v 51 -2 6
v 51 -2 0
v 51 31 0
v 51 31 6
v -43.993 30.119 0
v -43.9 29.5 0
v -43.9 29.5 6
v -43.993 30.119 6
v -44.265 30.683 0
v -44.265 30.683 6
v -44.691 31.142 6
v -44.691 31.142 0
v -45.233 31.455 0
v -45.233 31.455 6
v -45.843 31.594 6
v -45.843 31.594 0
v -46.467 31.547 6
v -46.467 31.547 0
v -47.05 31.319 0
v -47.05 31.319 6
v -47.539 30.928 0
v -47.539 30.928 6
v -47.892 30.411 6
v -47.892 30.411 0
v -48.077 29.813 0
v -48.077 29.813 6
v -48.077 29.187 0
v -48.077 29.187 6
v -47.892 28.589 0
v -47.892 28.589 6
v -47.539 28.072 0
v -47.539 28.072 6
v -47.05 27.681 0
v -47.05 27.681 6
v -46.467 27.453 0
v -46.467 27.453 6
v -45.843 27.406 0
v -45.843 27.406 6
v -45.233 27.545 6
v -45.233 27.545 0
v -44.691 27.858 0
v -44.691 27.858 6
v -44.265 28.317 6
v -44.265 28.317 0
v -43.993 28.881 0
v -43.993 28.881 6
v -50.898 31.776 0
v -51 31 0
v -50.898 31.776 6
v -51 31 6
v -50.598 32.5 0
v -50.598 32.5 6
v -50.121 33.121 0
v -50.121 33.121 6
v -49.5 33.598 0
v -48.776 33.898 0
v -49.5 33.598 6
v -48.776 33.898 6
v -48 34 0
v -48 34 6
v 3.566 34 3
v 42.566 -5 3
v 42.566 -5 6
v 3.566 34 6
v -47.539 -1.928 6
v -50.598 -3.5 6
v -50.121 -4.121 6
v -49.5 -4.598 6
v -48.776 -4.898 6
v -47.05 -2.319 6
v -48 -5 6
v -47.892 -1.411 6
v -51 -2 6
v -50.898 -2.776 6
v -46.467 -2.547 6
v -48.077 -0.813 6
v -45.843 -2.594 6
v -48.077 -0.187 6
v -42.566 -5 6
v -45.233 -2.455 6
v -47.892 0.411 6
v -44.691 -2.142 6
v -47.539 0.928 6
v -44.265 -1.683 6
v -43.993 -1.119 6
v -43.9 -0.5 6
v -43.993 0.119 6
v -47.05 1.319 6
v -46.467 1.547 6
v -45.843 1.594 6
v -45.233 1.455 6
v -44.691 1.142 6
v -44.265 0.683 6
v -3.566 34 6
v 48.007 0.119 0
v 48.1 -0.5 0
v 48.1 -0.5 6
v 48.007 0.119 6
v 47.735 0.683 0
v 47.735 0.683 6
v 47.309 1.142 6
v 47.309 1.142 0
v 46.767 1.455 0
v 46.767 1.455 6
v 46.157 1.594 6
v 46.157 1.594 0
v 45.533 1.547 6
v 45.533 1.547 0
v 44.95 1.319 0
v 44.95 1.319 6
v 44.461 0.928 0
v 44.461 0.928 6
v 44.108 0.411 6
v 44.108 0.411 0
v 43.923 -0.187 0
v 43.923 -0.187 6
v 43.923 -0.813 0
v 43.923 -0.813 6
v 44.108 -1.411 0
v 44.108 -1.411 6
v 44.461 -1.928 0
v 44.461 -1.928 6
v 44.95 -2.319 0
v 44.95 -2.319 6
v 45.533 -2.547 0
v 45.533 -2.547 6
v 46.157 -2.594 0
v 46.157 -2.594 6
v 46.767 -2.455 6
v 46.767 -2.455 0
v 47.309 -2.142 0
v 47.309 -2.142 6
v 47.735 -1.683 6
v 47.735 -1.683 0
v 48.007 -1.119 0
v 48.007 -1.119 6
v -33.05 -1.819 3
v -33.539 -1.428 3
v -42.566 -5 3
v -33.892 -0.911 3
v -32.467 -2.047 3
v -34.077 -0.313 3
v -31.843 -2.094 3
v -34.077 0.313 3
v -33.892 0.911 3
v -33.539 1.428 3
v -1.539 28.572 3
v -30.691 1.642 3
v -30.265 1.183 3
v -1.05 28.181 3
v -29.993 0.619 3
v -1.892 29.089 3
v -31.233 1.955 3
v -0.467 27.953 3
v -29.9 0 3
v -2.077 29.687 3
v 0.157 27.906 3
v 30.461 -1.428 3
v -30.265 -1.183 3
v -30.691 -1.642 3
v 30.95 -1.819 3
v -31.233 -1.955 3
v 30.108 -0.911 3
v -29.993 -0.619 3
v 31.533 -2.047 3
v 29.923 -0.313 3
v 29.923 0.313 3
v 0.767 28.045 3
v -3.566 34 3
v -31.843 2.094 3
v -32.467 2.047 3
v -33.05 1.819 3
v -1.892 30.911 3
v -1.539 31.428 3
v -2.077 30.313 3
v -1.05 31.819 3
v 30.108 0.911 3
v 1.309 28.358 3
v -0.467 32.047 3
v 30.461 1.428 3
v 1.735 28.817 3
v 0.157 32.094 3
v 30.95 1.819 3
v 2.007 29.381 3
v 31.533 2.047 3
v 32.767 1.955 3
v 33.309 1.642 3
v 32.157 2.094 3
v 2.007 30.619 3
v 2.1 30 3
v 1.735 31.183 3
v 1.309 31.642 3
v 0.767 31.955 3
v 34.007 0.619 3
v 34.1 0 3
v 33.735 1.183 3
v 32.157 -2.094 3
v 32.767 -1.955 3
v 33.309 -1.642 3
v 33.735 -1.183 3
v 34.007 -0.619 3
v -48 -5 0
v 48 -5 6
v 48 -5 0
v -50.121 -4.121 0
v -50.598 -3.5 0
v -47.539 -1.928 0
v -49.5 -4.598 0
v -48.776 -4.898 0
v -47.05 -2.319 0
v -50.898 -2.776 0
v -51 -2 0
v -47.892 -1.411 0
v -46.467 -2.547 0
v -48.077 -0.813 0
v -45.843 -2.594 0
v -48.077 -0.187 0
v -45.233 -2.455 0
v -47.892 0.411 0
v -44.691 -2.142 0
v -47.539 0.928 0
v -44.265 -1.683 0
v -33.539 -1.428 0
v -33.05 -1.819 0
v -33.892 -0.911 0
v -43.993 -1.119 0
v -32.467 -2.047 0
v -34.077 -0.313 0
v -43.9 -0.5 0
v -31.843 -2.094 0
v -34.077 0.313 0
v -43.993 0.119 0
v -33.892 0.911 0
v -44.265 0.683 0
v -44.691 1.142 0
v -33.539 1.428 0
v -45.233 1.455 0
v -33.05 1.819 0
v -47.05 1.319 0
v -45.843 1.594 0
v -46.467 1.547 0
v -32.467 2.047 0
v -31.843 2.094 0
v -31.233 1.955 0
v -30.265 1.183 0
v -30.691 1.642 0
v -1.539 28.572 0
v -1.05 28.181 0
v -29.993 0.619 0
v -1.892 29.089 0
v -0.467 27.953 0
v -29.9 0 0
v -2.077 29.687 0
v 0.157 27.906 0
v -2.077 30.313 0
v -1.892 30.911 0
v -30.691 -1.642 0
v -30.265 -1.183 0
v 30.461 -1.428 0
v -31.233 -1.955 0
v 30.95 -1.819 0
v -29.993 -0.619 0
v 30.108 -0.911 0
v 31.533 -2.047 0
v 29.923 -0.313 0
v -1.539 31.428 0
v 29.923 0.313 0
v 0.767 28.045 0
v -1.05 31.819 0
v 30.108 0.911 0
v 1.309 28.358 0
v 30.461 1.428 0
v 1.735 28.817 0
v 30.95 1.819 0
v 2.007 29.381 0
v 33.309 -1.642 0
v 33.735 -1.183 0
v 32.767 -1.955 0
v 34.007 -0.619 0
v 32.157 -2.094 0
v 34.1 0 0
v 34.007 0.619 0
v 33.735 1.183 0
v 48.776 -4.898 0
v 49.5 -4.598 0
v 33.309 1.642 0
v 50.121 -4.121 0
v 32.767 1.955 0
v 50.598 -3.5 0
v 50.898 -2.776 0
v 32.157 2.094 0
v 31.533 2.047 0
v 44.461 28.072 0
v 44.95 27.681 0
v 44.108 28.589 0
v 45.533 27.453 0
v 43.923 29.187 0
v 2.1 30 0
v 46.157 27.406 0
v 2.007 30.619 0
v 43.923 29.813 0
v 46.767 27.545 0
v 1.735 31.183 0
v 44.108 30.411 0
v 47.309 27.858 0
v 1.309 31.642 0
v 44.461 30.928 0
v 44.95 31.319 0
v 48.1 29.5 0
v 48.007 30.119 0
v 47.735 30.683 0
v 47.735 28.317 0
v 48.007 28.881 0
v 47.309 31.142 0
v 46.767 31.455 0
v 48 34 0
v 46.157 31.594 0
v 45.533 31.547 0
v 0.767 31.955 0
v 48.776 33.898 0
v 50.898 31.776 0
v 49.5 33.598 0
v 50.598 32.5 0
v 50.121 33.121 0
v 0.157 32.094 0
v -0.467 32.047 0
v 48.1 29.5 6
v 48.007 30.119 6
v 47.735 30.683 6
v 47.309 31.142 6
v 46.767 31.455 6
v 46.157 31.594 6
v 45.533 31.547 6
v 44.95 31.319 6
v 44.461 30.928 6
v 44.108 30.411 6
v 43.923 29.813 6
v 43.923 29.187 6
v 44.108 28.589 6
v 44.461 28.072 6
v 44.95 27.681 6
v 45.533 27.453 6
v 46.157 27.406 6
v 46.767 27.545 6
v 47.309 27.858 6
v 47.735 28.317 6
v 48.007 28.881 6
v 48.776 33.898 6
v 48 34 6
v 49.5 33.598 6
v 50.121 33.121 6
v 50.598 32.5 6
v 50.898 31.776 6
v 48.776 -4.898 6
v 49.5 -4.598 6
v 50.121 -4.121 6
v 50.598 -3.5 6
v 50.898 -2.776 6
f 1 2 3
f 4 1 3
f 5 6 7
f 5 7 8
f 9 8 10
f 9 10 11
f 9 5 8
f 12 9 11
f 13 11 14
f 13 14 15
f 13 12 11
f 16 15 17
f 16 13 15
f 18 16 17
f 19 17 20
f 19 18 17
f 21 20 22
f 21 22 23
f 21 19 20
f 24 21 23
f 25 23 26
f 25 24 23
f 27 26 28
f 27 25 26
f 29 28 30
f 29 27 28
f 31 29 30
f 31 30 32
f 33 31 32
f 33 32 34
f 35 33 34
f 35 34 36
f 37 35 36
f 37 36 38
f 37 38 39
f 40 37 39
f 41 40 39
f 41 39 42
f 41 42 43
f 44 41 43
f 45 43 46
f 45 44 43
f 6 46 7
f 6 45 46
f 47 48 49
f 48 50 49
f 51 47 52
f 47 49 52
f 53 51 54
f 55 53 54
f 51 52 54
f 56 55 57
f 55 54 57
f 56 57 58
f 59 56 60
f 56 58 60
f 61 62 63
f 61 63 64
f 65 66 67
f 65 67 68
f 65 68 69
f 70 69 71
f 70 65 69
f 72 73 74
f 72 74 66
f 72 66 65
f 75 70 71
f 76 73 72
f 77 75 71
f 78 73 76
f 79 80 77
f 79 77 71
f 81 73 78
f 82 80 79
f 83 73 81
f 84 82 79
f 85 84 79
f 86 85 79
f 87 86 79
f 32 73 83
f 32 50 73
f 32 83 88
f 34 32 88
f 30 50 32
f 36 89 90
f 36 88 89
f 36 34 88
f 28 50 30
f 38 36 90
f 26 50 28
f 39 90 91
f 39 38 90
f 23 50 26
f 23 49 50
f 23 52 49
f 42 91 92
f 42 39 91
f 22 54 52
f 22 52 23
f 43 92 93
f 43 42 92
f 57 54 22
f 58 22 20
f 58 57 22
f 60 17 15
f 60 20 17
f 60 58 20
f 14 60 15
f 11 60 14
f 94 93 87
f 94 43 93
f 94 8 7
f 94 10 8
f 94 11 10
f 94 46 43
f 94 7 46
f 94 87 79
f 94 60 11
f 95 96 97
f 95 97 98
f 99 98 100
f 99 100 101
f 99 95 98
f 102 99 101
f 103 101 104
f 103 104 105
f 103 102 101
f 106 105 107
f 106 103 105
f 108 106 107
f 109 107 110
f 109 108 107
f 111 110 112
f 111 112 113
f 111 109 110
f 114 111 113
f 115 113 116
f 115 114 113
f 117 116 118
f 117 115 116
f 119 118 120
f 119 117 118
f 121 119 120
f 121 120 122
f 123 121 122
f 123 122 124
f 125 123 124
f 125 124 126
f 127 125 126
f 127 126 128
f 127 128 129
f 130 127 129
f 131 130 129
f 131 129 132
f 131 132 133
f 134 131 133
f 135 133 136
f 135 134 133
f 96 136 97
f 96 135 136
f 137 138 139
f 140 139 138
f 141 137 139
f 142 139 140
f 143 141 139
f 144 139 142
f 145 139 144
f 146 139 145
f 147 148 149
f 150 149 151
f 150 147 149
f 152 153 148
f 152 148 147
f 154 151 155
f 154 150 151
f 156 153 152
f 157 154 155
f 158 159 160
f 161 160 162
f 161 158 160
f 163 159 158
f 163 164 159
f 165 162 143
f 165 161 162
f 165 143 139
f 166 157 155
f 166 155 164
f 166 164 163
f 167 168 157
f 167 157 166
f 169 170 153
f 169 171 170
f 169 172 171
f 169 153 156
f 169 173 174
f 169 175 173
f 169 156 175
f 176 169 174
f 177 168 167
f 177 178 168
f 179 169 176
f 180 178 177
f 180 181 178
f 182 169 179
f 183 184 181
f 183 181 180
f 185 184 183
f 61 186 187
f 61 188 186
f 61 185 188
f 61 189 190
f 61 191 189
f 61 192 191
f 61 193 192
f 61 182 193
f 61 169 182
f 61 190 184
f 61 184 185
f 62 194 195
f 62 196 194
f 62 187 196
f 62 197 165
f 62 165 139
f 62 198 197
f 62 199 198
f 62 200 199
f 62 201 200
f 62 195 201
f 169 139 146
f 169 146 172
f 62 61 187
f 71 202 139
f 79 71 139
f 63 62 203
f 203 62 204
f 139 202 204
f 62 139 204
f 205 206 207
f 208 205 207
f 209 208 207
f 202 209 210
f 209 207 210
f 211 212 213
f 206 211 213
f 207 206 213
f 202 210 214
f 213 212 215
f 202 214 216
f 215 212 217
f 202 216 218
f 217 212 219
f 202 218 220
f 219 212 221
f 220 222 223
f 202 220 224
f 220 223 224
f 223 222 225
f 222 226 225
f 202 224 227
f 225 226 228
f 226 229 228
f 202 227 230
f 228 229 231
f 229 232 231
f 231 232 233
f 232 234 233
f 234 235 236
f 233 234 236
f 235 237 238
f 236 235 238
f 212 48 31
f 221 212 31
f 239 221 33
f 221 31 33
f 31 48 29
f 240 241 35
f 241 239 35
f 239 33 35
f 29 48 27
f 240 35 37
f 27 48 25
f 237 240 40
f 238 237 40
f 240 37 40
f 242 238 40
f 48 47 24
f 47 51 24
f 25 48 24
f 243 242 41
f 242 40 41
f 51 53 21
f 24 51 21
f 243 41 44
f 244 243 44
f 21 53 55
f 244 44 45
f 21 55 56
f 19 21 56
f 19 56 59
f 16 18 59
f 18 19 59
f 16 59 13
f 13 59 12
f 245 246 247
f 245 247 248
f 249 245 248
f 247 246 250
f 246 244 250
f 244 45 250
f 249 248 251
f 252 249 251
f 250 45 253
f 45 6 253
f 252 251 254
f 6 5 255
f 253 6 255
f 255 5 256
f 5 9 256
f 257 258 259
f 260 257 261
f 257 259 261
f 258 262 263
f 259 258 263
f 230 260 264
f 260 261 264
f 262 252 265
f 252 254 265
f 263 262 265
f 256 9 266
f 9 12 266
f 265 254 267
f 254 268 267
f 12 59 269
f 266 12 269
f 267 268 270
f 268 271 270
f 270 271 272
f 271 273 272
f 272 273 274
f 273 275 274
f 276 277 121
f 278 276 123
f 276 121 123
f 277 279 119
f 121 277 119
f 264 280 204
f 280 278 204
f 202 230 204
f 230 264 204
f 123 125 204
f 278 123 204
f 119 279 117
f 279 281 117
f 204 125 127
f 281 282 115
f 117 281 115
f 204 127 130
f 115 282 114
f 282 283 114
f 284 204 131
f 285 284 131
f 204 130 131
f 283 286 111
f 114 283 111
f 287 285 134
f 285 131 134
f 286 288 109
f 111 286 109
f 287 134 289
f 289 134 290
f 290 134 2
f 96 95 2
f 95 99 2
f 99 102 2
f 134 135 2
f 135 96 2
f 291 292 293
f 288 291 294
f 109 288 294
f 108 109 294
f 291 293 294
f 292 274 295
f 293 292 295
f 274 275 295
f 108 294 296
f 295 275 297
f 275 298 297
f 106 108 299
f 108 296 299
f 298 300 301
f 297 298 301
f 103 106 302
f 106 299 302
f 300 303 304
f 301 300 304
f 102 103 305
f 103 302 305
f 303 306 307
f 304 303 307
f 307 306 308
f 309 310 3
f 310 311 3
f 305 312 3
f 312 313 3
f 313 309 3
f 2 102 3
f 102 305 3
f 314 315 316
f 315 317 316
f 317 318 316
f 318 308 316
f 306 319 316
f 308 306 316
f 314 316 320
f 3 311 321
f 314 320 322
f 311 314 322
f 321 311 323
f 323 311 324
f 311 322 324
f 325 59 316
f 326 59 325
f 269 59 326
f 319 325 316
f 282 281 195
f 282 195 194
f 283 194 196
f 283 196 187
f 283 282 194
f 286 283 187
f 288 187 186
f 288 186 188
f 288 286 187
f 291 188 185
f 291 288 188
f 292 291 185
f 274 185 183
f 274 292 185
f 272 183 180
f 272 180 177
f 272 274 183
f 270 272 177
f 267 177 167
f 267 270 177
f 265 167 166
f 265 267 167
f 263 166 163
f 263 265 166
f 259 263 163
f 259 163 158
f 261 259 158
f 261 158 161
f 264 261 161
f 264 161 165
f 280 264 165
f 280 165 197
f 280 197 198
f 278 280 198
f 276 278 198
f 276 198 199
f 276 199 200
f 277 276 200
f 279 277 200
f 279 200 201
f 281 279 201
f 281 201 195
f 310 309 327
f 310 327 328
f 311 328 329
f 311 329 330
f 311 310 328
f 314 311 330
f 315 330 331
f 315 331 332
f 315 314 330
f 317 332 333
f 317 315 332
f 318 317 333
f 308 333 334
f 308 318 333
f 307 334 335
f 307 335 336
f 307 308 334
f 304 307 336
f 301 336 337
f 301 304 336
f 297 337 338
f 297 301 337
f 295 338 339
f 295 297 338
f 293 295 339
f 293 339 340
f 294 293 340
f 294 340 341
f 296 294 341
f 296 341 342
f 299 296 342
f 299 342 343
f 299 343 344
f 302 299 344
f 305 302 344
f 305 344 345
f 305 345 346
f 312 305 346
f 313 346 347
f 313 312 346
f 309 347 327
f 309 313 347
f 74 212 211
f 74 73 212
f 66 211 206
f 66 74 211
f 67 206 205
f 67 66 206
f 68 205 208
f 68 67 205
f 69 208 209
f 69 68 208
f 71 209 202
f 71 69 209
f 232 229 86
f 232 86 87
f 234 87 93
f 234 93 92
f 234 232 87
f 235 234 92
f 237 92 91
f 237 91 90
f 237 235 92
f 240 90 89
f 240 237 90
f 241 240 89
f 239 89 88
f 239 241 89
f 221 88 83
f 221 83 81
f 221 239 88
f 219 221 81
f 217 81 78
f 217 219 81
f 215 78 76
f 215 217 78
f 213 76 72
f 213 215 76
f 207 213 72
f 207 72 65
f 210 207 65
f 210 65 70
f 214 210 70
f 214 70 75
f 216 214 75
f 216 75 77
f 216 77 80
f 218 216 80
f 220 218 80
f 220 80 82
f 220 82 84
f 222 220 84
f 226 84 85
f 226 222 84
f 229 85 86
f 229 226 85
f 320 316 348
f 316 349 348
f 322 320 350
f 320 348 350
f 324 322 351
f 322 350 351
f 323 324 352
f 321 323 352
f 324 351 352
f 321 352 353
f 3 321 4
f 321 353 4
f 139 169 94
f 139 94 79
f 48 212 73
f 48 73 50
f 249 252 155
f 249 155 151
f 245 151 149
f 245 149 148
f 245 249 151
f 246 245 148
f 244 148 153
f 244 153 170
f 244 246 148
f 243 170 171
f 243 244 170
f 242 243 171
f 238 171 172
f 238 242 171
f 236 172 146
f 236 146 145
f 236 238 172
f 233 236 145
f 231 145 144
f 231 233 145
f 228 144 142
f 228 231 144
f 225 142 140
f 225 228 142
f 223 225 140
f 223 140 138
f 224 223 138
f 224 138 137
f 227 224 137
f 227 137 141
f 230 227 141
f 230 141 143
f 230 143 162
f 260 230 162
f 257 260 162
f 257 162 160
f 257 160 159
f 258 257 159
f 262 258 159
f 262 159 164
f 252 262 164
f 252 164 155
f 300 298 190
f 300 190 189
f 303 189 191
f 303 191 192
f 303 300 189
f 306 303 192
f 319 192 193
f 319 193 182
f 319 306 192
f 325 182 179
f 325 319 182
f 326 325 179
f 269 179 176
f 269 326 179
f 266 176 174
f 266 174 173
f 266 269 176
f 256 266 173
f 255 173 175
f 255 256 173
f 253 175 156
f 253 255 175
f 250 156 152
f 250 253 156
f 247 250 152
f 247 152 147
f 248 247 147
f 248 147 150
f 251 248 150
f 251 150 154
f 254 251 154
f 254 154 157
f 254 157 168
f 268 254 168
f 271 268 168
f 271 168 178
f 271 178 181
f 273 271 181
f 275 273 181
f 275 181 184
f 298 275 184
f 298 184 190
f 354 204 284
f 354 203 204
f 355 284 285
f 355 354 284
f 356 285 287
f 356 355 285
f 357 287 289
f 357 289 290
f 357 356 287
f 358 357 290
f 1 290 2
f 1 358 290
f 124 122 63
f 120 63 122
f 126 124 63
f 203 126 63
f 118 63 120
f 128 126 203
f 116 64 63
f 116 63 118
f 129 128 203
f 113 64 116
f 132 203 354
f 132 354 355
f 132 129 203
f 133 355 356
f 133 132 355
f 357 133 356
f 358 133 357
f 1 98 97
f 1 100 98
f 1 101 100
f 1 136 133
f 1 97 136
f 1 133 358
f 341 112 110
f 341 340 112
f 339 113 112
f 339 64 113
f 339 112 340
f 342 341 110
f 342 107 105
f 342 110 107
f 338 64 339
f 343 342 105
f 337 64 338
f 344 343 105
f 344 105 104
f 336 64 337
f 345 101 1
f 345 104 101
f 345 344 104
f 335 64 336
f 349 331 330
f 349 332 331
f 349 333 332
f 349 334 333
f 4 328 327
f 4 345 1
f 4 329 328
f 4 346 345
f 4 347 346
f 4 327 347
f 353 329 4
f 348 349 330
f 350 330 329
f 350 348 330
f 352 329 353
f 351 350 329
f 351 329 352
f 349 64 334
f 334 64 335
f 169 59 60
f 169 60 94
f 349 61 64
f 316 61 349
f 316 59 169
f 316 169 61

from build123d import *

# Parameters (mm, degrees)
SKETCH_1_R          = 2.1
EXTRUDE_1_DEPTH     = 6
EXTRUDE_START       = -6
SKETCH_2_W          = 102
SKETCH_2_H          = 39
SKETCH_2_R          = 2.1
EXTRUDE_2_DEPTH     = 6
CUT_EXTRUDE_START   = -3
SKETCH_3_R          = 2.1
CUT_EXTRUDE_2_DEPTH = 3
FILLET_1_R          = 3


with BuildPart() as part:
    # 草图1 → 凸台-拉伸1 (new body)
    with BuildSketch(Plane.XY):
        Polygon((-42.425, -5), (42.425, -5), (3.425, 34), (-3.425, 34), align=None)
        with Locations((0, 30)):
            Circle(SKETCH_1_R, mode=Mode.SUBTRACT)
        with Locations((-32, 0)):
            Circle(SKETCH_1_R, mode=Mode.SUBTRACT)
        with Locations((32, 0)):
            Circle(SKETCH_1_R, mode=Mode.SUBTRACT)
    extrude(amount=EXTRUDE_1_DEPTH)

    # 草图2 → 凸台-拉伸2 (add)
    with BuildSketch(Plane.XY.offset(6).offset(EXTRUDE_START)):
        with Locations((0, 14.5)):
            Rectangle(SKETCH_2_W, SKETCH_2_H)
        with Locations((-46, -0.5)):
            Circle(SKETCH_2_R, mode=Mode.SUBTRACT)
        with Locations((-46, 29.5)):
            Circle(SKETCH_2_R, mode=Mode.SUBTRACT)
        with Locations((46, 29.5)):
            Circle(SKETCH_2_R, mode=Mode.SUBTRACT)
        with Locations((46, -0.5)):
            Circle(SKETCH_2_R, mode=Mode.SUBTRACT)
        with Locations((-32, 0)):
            Circle(SKETCH_2_R, mode=Mode.SUBTRACT)
        with Locations((0, 30)):
            Circle(SKETCH_2_R, mode=Mode.SUBTRACT)
        with Locations((32, 0)):
            Circle(SKETCH_2_R, mode=Mode.SUBTRACT)
    extrude(amount=EXTRUDE_2_DEPTH)

    # 草图3 → 切除-拉伸2 (cut)
    with BuildSketch(Plane.XY.offset(6).offset(CUT_EXTRUDE_START)):
        Polygon((-3.425, 34), (-3.566421356, 34), (-42.495710678, -4.929289322), (-42.566421356, -5), (-42.425, -5), (42.425, -5), (42.566421356, -5), (42.495710678, -4.929289322), (3.566421356, 34), (3.425, 34), align=None)
        with Locations((-32, 0)):
            Circle(SKETCH_3_R, mode=Mode.SUBTRACT)
        with Locations((32, 0)):
            Circle(SKETCH_3_R, mode=Mode.SUBTRACT)
        with Locations((0, 30)):
            Circle(SKETCH_3_R, mode=Mode.SUBTRACT)
    extrude(amount=CUT_EXTRUDE_2_DEPTH, mode=Mode.SUBTRACT)

    # 圆角1
    fillet_1_edges = [part.edges().sort_by_distance(p)[0] for p in [
        (-51, 34, 3),
        (51, -5, 3),
        (-51, -5, 3),
        (51, 34, 3),
    ]]
    fillet(fillet_1_edges, radius=FILLET_1_R)


solid = part.part
